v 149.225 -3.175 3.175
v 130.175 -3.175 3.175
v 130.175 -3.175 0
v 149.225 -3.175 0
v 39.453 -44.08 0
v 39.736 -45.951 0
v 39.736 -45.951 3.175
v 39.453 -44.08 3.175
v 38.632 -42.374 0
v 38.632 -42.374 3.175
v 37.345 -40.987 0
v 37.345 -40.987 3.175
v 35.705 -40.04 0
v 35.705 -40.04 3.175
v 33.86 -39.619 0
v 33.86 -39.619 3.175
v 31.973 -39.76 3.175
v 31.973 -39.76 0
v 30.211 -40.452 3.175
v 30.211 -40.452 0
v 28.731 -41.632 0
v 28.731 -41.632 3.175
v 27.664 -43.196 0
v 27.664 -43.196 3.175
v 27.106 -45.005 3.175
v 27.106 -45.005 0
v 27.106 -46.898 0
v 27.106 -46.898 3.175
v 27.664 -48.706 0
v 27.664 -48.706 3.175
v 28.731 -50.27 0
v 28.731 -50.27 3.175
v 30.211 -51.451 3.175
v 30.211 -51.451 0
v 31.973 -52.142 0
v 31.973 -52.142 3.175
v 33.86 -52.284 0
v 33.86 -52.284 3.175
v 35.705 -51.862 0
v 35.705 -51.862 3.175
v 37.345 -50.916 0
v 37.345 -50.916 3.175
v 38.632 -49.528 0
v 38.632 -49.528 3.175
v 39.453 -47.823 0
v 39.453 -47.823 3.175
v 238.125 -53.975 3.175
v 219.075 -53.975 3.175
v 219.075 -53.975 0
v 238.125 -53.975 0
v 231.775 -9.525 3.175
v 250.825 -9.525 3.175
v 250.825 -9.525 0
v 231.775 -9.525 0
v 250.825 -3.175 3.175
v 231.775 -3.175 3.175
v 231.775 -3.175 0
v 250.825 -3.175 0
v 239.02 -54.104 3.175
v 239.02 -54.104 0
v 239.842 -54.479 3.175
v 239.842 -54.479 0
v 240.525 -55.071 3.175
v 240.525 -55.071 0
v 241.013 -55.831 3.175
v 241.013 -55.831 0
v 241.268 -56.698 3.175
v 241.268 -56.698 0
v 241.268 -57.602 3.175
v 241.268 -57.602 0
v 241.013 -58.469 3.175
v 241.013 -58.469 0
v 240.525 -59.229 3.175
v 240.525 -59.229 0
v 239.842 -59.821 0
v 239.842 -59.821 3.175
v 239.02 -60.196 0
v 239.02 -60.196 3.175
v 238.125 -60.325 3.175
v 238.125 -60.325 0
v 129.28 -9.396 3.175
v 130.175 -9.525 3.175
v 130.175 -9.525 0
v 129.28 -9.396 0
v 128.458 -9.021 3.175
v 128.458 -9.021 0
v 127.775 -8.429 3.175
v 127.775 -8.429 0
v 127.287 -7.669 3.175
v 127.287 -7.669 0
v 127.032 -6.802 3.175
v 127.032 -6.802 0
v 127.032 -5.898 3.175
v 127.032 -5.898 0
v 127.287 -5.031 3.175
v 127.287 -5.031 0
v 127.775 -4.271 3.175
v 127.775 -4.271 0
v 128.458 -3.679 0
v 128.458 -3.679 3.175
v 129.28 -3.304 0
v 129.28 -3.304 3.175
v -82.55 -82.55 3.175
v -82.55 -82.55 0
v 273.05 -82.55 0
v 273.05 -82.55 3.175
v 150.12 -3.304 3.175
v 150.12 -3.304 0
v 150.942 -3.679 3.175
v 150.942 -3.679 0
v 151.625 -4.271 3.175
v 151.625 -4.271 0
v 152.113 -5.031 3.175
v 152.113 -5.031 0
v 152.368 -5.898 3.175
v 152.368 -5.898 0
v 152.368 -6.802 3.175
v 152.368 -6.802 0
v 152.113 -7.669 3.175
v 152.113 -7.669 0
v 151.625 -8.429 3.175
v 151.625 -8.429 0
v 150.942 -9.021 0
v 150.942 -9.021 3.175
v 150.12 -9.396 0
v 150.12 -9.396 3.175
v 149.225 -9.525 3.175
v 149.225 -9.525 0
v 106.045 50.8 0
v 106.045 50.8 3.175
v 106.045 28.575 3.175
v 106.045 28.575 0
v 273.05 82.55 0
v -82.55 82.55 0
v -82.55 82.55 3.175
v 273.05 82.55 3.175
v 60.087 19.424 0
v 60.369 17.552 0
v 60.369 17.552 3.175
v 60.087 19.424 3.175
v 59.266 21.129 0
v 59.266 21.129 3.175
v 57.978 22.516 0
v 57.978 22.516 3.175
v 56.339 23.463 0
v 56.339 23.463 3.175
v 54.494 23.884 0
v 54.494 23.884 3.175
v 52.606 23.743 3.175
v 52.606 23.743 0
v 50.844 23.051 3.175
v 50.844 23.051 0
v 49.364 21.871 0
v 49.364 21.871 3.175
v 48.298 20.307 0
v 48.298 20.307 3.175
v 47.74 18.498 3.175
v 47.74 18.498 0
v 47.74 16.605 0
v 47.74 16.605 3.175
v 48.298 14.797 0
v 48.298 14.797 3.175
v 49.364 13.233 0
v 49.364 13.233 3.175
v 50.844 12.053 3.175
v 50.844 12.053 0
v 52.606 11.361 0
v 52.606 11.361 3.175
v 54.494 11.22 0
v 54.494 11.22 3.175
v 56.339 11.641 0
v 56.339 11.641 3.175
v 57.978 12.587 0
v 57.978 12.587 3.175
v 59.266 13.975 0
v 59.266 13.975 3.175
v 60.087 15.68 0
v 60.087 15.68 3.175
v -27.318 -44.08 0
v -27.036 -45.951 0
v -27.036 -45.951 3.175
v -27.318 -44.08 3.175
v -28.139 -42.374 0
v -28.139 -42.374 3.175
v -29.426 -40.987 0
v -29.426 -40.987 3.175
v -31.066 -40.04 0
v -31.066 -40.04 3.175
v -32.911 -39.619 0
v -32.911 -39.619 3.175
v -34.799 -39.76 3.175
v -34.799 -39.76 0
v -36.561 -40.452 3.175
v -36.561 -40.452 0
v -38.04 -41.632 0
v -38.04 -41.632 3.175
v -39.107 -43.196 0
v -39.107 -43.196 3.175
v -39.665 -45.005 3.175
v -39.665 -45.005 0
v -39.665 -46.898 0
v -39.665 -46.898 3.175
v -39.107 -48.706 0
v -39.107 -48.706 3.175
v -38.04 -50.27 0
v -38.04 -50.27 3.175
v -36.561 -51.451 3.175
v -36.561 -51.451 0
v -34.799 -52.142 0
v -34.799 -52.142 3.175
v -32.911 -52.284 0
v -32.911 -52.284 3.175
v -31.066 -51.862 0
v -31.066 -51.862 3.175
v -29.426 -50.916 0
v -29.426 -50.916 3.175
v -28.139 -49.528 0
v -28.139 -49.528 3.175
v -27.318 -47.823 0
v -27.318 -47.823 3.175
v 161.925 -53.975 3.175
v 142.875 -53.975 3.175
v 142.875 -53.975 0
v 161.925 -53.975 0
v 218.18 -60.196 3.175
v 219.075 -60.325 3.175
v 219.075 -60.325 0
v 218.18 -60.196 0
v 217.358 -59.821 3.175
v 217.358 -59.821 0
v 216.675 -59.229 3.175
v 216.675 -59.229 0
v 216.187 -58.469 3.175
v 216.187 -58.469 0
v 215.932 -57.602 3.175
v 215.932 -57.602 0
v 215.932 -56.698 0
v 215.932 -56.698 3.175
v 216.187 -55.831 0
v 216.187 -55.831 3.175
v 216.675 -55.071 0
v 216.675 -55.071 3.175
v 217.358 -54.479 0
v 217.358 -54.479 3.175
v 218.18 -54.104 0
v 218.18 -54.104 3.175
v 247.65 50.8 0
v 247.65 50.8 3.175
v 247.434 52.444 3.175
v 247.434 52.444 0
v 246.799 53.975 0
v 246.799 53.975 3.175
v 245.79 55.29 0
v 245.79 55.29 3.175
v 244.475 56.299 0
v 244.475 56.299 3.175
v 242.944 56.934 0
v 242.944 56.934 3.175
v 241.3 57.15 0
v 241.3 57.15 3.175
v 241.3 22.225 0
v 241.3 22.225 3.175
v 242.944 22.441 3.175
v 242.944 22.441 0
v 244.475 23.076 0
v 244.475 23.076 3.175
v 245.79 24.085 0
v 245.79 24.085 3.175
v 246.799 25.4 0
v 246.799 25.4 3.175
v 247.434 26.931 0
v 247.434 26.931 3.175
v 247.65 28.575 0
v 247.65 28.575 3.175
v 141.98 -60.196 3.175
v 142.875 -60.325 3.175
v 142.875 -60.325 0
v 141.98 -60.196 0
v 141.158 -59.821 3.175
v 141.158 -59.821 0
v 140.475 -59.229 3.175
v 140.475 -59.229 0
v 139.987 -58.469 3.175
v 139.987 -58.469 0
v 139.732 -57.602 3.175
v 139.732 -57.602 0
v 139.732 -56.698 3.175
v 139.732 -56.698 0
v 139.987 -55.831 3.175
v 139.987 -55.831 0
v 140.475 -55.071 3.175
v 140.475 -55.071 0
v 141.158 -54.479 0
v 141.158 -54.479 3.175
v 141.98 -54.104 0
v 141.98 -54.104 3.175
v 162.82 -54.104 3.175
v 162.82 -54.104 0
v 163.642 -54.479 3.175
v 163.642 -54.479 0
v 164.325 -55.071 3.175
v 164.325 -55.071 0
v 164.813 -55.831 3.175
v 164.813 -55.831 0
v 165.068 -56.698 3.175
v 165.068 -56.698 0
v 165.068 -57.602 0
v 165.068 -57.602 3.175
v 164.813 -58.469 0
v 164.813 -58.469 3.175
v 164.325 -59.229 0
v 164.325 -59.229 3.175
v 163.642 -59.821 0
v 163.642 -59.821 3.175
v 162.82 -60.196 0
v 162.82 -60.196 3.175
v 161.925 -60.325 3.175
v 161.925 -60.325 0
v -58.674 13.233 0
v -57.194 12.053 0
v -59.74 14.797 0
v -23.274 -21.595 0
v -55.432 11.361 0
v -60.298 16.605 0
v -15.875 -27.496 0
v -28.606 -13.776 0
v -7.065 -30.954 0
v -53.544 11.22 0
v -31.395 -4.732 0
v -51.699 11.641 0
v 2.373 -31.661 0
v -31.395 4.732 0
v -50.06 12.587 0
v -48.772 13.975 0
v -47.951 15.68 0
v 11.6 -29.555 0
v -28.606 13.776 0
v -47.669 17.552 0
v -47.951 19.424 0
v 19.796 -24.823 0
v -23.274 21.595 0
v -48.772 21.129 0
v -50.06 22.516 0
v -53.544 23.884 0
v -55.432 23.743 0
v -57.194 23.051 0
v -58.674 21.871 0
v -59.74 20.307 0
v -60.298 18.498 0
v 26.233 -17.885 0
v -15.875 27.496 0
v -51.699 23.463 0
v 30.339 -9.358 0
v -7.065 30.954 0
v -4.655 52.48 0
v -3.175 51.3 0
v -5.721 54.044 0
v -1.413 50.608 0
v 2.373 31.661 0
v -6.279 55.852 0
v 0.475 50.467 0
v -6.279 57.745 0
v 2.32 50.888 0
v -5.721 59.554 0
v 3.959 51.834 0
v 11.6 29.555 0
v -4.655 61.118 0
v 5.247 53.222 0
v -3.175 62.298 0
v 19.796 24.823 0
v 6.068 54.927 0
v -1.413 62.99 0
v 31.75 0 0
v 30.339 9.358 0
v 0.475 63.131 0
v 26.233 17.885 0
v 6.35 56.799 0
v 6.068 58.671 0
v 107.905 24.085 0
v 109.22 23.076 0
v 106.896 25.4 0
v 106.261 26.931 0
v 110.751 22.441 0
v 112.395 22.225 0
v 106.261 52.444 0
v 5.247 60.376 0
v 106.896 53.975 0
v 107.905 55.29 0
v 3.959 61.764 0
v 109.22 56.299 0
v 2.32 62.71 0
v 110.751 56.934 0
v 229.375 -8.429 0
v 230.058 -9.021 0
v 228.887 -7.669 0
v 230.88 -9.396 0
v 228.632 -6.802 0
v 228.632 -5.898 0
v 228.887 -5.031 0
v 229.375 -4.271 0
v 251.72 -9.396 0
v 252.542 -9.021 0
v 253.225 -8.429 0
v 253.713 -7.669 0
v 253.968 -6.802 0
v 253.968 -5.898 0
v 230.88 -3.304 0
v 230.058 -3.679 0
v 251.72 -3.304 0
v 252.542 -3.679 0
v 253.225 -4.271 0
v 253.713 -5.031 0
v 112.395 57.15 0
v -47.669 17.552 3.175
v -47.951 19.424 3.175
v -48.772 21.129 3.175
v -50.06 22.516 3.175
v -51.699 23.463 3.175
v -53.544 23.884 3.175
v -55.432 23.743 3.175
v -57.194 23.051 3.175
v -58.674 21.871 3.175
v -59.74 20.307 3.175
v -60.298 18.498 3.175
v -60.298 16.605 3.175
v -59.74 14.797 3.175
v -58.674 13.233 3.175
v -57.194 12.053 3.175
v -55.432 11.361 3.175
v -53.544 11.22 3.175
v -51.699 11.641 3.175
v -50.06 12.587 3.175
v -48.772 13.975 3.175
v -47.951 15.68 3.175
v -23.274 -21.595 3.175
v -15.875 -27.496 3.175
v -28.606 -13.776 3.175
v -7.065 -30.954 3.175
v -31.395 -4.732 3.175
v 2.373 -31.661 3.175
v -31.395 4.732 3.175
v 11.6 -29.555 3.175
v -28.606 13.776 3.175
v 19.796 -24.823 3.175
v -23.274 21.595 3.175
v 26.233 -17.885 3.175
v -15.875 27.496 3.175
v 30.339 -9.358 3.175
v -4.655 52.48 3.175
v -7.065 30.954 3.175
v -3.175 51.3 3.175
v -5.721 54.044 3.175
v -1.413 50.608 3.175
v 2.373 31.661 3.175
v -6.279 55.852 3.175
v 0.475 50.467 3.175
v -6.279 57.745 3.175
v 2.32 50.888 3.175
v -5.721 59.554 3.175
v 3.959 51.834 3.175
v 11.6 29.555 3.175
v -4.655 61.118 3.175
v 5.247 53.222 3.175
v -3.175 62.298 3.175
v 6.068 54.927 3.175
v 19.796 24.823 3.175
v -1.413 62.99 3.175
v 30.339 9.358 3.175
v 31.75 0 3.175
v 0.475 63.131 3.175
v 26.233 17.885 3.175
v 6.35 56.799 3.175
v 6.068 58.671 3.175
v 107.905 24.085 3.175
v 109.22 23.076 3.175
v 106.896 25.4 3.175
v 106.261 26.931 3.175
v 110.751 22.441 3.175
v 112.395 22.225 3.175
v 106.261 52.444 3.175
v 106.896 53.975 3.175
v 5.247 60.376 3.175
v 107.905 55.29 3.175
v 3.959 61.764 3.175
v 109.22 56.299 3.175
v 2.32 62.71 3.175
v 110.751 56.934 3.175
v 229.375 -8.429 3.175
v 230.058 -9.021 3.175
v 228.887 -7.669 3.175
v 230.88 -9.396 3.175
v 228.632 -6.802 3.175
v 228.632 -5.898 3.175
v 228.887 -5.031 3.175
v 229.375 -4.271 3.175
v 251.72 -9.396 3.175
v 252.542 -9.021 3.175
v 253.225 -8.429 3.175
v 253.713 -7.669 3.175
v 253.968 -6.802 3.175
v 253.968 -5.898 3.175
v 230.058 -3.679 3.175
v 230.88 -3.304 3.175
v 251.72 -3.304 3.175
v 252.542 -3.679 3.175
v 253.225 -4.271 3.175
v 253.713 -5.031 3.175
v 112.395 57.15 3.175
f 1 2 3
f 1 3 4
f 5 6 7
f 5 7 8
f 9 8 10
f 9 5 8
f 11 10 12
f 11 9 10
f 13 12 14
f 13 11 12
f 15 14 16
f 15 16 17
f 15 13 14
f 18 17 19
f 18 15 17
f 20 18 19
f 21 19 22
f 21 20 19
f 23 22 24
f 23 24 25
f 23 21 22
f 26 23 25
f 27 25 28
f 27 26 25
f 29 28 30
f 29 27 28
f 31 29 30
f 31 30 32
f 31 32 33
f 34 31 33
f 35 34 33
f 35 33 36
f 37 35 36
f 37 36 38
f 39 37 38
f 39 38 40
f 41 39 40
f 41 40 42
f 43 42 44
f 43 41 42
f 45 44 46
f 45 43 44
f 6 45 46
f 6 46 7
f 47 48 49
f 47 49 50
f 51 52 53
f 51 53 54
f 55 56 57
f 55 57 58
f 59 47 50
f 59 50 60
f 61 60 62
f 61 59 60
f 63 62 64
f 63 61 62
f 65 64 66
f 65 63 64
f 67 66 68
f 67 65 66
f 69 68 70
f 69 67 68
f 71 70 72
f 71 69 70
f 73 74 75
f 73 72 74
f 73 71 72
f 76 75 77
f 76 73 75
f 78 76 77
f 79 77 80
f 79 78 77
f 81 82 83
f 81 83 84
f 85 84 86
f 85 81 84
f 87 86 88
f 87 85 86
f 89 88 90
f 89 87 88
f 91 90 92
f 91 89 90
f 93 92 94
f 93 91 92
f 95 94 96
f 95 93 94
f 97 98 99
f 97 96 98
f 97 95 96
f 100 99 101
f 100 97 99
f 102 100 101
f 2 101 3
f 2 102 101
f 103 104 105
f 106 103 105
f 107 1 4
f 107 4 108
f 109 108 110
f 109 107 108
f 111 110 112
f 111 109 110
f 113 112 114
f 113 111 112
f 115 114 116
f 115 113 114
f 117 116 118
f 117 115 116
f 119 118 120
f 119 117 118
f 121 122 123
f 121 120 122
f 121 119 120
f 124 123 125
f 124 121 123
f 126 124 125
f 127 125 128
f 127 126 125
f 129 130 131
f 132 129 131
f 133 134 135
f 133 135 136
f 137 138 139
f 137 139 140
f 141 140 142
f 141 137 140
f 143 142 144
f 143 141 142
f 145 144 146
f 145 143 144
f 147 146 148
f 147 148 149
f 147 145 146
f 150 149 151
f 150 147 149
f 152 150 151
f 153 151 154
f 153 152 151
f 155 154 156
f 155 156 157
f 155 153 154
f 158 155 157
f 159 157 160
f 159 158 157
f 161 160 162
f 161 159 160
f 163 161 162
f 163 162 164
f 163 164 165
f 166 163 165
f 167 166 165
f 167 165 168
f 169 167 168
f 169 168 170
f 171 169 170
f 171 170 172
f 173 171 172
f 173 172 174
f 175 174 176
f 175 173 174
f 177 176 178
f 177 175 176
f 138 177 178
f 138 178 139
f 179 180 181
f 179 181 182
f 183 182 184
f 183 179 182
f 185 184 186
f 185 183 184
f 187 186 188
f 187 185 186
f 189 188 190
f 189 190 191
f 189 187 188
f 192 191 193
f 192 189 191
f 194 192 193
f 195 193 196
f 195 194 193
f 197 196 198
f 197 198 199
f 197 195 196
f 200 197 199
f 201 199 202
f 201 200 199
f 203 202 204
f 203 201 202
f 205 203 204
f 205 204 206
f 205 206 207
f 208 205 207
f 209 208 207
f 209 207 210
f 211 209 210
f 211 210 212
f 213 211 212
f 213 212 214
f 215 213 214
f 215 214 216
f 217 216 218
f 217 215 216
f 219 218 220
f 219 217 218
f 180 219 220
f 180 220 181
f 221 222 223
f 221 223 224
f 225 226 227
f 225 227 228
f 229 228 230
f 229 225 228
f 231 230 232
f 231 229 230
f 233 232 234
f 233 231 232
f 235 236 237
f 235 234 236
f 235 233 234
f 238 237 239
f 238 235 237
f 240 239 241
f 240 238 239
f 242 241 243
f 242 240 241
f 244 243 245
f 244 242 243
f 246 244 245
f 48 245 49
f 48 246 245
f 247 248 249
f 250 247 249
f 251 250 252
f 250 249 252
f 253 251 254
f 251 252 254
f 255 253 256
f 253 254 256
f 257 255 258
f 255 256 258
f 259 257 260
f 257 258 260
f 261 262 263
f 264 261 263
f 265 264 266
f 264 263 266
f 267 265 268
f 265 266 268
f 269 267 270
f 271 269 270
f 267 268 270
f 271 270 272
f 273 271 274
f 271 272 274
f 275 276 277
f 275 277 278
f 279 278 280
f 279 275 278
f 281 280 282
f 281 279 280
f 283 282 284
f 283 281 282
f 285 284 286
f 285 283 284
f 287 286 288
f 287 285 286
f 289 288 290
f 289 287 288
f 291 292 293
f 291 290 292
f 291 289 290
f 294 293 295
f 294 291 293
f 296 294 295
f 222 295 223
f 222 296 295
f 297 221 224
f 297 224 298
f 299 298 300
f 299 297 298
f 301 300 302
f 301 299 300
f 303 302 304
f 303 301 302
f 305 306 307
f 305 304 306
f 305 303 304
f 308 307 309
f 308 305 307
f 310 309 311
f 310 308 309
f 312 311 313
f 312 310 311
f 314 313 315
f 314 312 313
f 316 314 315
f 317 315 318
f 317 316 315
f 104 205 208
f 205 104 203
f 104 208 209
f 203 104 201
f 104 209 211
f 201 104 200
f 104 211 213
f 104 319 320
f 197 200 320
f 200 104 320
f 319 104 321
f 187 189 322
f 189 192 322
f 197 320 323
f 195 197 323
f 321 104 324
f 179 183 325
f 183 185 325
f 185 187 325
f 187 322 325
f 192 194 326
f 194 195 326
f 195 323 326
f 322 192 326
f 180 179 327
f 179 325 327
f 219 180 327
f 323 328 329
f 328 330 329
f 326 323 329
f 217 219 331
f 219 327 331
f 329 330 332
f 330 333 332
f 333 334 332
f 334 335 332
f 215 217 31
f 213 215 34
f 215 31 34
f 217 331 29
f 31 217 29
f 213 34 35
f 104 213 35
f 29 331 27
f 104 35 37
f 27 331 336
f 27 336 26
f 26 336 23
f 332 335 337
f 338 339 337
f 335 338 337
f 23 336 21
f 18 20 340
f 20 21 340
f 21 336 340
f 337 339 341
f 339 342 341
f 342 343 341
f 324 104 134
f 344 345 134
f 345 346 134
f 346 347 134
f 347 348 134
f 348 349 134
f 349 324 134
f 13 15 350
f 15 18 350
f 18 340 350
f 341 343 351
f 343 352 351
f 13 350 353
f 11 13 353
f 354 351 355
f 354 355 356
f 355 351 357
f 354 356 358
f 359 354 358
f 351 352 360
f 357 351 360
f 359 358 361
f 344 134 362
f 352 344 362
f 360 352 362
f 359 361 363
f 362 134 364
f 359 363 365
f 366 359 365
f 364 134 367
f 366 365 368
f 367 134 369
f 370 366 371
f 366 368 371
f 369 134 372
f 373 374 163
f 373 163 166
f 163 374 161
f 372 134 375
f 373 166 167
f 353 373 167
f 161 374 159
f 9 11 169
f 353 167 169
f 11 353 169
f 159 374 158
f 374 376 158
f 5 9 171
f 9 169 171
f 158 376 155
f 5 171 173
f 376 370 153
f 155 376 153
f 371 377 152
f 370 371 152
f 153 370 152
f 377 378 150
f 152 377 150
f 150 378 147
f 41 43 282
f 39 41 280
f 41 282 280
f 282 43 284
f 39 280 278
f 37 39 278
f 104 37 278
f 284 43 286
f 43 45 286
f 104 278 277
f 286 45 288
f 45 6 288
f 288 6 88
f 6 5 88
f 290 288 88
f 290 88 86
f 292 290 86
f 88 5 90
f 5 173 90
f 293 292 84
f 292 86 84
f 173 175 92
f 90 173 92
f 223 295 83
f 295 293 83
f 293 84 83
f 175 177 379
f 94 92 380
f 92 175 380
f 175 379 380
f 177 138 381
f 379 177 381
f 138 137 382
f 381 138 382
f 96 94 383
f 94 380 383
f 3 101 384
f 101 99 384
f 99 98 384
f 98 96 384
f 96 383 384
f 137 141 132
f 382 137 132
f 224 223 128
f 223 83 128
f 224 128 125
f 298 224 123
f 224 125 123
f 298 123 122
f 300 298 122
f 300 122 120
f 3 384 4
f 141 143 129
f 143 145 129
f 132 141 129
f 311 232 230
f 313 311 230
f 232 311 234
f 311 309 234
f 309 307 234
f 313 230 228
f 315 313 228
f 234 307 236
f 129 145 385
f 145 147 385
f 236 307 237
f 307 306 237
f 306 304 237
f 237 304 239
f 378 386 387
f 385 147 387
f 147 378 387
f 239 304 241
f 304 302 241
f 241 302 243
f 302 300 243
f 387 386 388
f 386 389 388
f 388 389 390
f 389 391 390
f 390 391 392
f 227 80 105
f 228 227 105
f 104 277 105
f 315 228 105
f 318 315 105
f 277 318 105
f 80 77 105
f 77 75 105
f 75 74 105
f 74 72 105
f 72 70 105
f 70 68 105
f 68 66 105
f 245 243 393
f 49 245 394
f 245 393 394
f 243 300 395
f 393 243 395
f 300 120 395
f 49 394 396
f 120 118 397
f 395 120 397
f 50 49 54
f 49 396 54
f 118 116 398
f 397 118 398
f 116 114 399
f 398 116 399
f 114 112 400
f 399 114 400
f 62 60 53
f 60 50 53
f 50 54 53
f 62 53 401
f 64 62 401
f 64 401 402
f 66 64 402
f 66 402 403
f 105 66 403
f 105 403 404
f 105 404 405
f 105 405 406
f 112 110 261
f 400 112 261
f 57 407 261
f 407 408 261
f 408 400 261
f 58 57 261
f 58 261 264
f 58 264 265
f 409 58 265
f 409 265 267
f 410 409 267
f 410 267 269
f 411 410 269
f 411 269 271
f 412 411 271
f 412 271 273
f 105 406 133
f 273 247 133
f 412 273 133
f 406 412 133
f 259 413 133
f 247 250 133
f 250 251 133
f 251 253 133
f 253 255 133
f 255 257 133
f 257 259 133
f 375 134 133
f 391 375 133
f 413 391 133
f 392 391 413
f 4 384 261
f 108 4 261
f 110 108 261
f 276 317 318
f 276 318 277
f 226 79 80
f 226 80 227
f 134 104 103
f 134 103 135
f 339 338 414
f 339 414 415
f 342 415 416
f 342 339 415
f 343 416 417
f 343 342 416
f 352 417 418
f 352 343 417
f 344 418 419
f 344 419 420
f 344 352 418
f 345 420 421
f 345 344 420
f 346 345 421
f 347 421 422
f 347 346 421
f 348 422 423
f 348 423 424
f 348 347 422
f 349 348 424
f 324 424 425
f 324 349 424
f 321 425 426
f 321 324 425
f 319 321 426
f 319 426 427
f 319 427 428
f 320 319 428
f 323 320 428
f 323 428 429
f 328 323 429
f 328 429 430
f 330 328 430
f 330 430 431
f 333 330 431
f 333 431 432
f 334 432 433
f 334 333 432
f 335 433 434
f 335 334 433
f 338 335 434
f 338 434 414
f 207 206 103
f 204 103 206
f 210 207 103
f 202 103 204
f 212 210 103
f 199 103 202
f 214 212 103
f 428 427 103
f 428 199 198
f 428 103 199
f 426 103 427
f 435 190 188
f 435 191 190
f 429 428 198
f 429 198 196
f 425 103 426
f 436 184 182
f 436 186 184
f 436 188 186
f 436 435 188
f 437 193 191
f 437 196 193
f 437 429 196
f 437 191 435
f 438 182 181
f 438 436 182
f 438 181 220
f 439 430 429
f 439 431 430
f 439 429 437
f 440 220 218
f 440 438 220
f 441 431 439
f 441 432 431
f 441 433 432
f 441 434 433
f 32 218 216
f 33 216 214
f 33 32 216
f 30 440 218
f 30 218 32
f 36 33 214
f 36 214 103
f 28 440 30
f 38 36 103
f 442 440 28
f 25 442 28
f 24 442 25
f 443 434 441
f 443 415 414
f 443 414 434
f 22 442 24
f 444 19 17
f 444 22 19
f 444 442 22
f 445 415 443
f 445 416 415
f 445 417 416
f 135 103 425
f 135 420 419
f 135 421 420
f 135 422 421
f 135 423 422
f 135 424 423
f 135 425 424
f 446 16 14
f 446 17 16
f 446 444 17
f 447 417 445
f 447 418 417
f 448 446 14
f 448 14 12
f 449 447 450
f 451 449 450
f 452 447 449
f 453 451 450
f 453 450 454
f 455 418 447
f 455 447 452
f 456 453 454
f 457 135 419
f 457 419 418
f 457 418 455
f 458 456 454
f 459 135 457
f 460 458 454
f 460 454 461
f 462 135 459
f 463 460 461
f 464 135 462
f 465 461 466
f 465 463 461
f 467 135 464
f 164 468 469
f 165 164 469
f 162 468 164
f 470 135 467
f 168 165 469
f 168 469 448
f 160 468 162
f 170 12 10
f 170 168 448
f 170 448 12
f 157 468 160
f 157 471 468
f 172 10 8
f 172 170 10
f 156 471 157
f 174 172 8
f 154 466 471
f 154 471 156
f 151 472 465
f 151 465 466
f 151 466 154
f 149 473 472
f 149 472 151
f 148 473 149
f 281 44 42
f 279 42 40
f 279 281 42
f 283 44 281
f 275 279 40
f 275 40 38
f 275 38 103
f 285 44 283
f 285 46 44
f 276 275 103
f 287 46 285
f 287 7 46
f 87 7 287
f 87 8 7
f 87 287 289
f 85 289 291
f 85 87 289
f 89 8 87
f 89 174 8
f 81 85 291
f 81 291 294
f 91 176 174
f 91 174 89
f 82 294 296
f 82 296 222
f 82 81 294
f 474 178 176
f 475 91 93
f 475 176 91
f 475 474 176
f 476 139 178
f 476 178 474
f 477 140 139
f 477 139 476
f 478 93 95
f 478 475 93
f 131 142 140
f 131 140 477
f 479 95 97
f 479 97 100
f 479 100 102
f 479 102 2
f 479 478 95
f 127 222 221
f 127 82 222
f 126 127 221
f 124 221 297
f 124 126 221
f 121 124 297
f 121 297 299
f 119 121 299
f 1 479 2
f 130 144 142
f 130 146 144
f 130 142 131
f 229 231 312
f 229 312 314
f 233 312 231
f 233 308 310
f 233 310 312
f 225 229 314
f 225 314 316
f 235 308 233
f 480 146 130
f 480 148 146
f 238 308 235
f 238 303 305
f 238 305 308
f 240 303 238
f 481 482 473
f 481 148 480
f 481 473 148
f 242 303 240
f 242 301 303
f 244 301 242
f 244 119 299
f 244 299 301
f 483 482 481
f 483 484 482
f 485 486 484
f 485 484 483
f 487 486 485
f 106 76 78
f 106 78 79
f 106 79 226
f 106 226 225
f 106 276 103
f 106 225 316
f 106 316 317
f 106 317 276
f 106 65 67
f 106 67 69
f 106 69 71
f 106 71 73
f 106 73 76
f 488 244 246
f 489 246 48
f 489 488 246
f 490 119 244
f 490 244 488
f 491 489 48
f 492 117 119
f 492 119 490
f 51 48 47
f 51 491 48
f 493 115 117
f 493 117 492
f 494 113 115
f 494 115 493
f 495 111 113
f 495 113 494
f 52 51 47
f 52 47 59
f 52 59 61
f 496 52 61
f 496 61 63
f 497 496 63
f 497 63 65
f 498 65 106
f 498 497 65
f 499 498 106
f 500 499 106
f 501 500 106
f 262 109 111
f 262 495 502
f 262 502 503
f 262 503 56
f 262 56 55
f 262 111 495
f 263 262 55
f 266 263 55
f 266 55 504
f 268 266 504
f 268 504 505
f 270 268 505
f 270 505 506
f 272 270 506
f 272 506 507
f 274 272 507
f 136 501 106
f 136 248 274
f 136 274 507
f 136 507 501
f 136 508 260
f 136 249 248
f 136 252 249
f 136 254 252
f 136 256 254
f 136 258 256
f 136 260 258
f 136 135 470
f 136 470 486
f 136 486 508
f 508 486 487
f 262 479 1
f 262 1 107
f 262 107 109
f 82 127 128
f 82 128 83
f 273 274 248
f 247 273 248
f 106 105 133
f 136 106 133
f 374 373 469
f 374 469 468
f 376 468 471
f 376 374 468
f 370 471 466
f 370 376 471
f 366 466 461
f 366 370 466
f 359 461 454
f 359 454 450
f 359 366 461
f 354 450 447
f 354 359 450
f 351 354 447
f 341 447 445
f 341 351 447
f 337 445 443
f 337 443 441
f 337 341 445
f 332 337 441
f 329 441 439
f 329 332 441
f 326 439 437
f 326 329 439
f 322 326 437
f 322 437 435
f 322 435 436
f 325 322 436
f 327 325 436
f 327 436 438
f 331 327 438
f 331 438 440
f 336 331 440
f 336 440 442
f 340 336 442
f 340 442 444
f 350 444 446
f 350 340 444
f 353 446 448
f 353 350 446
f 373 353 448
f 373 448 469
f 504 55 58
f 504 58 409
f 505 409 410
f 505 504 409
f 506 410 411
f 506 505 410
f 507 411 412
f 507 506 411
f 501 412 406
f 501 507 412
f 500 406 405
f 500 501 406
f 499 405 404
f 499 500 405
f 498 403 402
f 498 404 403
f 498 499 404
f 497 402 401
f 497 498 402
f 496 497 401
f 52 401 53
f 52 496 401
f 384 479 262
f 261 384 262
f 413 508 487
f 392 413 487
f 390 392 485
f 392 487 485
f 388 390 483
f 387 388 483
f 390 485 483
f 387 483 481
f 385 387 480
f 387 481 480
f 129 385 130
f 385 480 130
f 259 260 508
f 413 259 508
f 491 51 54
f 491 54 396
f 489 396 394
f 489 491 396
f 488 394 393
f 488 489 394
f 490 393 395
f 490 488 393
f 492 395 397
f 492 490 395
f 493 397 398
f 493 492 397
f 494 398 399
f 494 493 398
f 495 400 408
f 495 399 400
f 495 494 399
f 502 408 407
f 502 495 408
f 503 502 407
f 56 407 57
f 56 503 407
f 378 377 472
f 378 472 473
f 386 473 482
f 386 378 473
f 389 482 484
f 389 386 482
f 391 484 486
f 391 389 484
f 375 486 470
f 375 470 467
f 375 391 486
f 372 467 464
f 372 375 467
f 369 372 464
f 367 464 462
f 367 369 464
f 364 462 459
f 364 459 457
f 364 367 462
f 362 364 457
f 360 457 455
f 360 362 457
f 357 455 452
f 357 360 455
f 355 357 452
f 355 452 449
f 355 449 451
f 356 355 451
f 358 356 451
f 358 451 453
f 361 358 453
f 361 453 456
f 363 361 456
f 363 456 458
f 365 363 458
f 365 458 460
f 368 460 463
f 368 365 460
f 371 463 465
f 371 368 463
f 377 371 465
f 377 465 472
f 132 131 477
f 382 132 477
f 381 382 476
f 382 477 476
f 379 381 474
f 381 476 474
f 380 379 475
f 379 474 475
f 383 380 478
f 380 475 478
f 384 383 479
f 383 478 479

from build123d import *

# Parameters (mm, degrees)
SKETCH2_W           = 355.6
SKETCH2_H           = 165.1
SKETCH2_R           = 31.75
SKETCH2_R_2         = 6.35
BOSS_EXTRUDE1_DEPTH = 3.175
CUT_EXTRUDE1_DEPTH  = 4.175
CUT_EXTRUDE3_DEPTH  = 4.175


with BuildPart() as part:
    # Sketch2 → Boss-Extrude1 (new body)
    with BuildSketch(Plane.XY):
        with Locations((95.25, 0)):
            Rectangle(SKETCH2_W, SKETCH2_H)
        Circle(SKETCH2_R, mode=Mode.SUBTRACT)
        with Locations((-54.018973032, 17.551828308)):
            Circle(SKETCH2_R_2, mode=Mode.SUBTRACT)
        with Locations((0, 56.798909535)):
            Circle(SKETCH2_R_2, mode=Mode.SUBTRACT)
        with Locations((54.018973032, 17.551828308)):
            Circle(SKETCH2_R_2, mode=Mode.SUBTRACT)
        with Locations((33.385561371, -45.951283076)):
            Circle(SKETCH2_R_2, mode=Mode.SUBTRACT)
        with Locations((-33.385561371, -45.951283076)):
            Circle(SKETCH2_R_2, mode=Mode.SUBTRACT)
    extrude(amount=BOSS_EXTRUDE1_DEPTH)

    # Sketch3 → Cut-Extrude1 (cut, through all)
    with BuildSketch(Plane.XY.offset(3.175)):
        with BuildLine():
            Line((149.225, -9.525), (130.175, -9.525))
            ThreePointArc((130.175, -9.525), (127, -6.35), (130.175, -3.175))
            Line((130.175, -3.175), (149.225, -3.175))
            ThreePointArc((149.225, -3.175), (152.4, -6.35), (149.225, -9.525))
        make_face()
        with BuildLine():
            Line((250.825, -9.525), (231.775, -9.525))
            ThreePointArc((231.775, -9.525), (228.6, -6.35), (231.775, -3.175))
            Line((231.775, -3.175), (250.825, -3.175))
            ThreePointArc((250.825, -3.175), (254, -6.35), (250.825, -9.525))
        make_face()
        with BuildLine():
            Line((238.125, -60.325), (219.075, -60.325))
            ThreePointArc((219.075, -60.325), (215.9, -57.15), (219.075, -53.975))
            Line((219.075, -53.975), (238.125, -53.975))
            ThreePointArc((238.125, -53.975), (241.3, -57.15), (238.125, -60.325))
        make_face()
        with BuildLine():
            Line((142.875, -53.975), (161.925, -53.975))
            ThreePointArc((161.925, -53.975), (165.1, -57.15), (161.925, -60.325))
            Line((161.925, -60.325), (142.875, -60.325))
            ThreePointArc((142.875, -60.325), (139.7, -57.15), (142.875, -53.975))
        make_face()
    extrude(amount=-CUT_EXTRUDE1_DEPTH, mode=Mode.SUBTRACT)

    # Sketch4 → Cut-Extrude3 (cut, through all)
    with BuildSketch(Plane.XY.offset(3.175)):
        with BuildLine():
            Line((247.65, 28.575), (247.65, 50.8))
            ThreePointArc((247.65, 50.8), (245.790128061, 55.290128061), (241.3, 57.15))
            Line((241.3, 57.15), (112.395, 57.15))
            ThreePointArc((112.395, 57.15), (107.904871939, 55.290128061), (106.045, 50.8))
            Line((106.045, 50.8), (106.045, 28.575))
            ThreePointArc((106.045, 28.575), (107.904871939, 24.084871939), (112.395, 22.225))
            Line((112.395, 22.225), (241.3, 22.225))
            ThreePointArc((241.3, 22.225), (245.790128061, 24.084871939), (247.65, 28.575))
        make_face()
    extrude(amount=-CUT_EXTRUDE3_DEPTH, mode=Mode.SUBTRACT)


solid = part.part
